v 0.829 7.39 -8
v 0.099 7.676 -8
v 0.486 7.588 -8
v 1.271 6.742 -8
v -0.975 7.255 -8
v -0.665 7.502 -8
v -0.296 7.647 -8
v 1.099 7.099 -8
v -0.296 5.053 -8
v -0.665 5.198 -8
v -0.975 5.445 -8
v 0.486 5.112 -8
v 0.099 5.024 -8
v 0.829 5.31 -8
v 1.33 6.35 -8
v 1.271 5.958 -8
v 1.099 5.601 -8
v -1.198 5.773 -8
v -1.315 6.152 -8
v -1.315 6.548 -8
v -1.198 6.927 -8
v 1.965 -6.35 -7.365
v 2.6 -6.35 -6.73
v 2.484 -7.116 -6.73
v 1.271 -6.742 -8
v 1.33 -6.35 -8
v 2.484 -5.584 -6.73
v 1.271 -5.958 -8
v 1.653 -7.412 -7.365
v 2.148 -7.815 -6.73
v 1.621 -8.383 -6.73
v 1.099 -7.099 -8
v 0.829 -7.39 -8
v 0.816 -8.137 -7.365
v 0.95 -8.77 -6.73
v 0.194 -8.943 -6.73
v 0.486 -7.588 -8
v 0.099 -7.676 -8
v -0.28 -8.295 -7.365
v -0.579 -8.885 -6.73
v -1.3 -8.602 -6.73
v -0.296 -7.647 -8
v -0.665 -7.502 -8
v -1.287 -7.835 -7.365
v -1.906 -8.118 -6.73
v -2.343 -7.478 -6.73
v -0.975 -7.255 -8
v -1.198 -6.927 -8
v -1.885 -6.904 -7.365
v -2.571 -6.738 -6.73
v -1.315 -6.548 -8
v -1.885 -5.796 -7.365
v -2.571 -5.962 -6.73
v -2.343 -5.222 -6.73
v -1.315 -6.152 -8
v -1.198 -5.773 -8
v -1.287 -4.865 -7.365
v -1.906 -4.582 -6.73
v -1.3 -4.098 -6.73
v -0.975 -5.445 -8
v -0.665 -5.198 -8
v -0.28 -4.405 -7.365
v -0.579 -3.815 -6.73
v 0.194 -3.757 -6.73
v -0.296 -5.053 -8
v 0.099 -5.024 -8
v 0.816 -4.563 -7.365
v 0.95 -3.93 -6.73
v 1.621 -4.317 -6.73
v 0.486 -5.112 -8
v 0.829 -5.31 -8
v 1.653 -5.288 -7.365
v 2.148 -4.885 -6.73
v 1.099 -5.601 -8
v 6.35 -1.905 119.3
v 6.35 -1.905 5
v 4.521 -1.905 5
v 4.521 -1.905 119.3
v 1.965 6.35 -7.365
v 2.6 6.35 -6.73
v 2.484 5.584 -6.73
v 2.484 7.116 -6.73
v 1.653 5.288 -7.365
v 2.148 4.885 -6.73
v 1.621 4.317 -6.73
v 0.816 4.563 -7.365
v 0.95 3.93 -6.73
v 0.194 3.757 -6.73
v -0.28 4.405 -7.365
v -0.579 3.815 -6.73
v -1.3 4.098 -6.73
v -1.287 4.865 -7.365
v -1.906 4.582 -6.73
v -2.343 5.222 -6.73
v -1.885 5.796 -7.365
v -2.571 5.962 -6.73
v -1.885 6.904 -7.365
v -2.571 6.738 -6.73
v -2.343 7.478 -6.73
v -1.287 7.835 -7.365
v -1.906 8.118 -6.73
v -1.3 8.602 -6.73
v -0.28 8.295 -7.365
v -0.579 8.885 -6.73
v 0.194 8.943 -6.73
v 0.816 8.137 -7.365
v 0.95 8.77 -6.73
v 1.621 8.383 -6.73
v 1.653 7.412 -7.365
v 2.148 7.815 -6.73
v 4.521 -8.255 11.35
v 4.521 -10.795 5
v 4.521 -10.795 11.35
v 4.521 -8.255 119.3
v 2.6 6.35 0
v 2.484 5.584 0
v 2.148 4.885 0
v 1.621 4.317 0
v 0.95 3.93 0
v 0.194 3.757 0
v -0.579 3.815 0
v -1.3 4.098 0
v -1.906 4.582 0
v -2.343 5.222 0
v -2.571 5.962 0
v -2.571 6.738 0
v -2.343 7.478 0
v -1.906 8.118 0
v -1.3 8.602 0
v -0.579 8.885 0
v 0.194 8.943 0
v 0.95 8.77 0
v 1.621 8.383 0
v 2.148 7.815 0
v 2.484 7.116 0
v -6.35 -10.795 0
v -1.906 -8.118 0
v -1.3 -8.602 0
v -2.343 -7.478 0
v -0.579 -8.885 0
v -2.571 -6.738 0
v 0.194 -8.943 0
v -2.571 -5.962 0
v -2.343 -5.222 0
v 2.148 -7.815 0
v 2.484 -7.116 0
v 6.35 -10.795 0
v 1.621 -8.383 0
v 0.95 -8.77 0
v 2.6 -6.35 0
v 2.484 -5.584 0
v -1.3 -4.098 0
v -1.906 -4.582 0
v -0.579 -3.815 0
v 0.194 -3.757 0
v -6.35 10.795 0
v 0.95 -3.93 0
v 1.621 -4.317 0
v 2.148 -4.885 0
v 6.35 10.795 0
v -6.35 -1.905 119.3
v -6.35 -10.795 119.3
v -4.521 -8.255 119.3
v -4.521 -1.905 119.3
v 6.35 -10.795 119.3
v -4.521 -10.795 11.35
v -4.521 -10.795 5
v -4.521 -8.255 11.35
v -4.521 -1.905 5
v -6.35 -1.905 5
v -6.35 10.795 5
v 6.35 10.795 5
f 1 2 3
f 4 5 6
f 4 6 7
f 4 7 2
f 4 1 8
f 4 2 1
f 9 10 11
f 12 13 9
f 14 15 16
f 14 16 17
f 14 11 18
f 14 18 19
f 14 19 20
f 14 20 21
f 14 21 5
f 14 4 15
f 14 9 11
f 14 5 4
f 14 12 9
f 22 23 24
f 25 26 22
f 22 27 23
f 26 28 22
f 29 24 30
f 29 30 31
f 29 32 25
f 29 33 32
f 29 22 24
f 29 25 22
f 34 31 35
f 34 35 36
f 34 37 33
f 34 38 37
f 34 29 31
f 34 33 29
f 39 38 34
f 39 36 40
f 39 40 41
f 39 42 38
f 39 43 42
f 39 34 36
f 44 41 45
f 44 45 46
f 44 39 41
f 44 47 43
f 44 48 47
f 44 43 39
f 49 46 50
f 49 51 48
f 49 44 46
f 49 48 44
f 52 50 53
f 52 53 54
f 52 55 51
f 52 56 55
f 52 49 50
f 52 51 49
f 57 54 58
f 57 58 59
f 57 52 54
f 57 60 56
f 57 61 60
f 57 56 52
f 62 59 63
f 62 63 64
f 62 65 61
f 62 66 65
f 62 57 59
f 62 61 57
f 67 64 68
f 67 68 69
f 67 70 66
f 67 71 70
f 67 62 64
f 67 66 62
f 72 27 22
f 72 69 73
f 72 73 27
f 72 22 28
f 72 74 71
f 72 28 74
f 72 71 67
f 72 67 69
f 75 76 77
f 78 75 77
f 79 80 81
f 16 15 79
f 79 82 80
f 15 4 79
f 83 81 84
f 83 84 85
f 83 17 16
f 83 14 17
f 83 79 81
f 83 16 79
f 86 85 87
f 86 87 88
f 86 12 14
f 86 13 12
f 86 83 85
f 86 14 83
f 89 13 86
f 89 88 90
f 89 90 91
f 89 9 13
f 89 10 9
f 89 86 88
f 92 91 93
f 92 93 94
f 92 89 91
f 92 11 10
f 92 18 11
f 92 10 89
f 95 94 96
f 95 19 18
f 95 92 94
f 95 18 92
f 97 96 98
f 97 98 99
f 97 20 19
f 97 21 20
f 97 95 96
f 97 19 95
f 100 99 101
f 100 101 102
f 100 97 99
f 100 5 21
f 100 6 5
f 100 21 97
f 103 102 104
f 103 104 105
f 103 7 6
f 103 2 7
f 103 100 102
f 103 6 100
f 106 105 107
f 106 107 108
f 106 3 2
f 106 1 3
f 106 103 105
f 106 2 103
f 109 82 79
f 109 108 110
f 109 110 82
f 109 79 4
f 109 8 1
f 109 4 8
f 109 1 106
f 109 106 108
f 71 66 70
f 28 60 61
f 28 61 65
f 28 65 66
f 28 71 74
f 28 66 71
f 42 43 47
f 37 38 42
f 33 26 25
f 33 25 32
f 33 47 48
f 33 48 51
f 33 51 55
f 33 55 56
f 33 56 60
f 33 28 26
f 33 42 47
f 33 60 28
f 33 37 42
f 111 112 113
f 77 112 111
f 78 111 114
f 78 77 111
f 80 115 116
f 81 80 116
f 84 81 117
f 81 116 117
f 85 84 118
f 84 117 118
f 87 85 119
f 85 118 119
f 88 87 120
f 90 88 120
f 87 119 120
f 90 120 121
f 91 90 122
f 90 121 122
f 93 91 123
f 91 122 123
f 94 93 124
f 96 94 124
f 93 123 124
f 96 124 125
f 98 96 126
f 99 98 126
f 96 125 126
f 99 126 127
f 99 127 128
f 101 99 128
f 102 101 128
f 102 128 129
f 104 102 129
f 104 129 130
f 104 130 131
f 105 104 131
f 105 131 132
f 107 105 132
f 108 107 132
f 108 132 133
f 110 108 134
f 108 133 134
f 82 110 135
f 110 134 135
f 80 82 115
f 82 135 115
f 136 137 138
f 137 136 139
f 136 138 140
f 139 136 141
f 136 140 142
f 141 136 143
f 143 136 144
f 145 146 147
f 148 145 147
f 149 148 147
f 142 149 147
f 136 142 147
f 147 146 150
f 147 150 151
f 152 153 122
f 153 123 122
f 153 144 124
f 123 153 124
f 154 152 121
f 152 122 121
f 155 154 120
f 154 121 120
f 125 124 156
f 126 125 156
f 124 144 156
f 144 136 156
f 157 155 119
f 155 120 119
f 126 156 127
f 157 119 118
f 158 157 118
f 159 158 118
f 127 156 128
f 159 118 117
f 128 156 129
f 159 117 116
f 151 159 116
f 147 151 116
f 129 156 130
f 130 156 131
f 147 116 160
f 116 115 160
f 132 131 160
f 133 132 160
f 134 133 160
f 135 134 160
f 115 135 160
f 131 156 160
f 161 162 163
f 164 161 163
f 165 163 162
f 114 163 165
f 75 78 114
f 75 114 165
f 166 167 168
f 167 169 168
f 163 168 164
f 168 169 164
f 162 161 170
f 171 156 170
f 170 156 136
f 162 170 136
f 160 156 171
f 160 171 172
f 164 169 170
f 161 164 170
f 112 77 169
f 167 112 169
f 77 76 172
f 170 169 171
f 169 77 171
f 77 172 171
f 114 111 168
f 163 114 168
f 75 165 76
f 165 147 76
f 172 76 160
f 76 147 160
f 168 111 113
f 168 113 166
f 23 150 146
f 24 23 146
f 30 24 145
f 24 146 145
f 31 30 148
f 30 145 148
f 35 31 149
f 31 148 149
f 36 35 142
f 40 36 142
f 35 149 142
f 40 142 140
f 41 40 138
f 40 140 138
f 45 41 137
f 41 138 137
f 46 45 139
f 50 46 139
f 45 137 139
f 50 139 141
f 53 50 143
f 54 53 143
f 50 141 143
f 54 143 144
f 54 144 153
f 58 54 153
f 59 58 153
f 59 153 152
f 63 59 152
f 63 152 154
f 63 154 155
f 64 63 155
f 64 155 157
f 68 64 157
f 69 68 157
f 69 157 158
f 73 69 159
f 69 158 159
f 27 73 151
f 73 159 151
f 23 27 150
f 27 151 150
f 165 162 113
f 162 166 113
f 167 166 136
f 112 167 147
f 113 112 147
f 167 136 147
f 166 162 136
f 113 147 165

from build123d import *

# Parameters (mm, degrees)
F0_W     = 12.7
F0_H     = 21.59
F1_DEPTH = 5
F2_R     = 2.599995
F3_DEPTH = 8
F4_SIZE  = 1.27
F6_DEPTH = 114.3
F7_W     = 9.0424
F7_H     = 6.35
F8_DEPTH = 2.54


with BuildPart() as f1:
    # F0 (on Top) → F1 (new body)
    with BuildSketch(Plane.XY):
        Rectangle(F0_W, F0_H)
    extrude(amount=F1_DEPTH)

    # F2 (on face) → F3 (join)
    with BuildSketch(Plane(origin=(0, 0, 0), x_dir=(1, 0, 0), z_dir=(0, 0, -1))):
        with Locations((0, 6.35)):
            Circle(F2_R)
        with Locations((0, -6.35)):
            Circle(F2_R)
    extrude(amount=F3_DEPTH)

    # F4
    f4_edges = [f1.edges().sort_by_distance(p)[0] for p in [
        (-2.599995, -6.35, -8),
        (-2.599995, 6.35, -8),
    ]]
    chamfer(f4_edges, length=F4_SIZE)

    # F5 (on face) → F6 (join)
    with BuildSketch(Plane.XY.offset(5)):
        Polygon((-6.35, -10.795), (6.35, -10.795), (6.35, -1.905), (4.5212, -1.905), (4.5212, -8.255), (-4.5212, -8.255), (-4.5212, -1.905), (-6.35, -1.905), align=None)
    extrude(amount=F6_DEPTH)

    # F7 (on face) → F8 (cut, through all)
    with BuildSketch(Plane(origin=(0, -8.255, 0), x_dir=(-1, 0, 0), z_dir=(0, 1, 0))):
        with Locations((0, 8.175)):
            Rectangle(F7_W, F7_H)
    extrude(amount=-F8_DEPTH, mode=Mode.SUBTRACT)


solid = f1.part
